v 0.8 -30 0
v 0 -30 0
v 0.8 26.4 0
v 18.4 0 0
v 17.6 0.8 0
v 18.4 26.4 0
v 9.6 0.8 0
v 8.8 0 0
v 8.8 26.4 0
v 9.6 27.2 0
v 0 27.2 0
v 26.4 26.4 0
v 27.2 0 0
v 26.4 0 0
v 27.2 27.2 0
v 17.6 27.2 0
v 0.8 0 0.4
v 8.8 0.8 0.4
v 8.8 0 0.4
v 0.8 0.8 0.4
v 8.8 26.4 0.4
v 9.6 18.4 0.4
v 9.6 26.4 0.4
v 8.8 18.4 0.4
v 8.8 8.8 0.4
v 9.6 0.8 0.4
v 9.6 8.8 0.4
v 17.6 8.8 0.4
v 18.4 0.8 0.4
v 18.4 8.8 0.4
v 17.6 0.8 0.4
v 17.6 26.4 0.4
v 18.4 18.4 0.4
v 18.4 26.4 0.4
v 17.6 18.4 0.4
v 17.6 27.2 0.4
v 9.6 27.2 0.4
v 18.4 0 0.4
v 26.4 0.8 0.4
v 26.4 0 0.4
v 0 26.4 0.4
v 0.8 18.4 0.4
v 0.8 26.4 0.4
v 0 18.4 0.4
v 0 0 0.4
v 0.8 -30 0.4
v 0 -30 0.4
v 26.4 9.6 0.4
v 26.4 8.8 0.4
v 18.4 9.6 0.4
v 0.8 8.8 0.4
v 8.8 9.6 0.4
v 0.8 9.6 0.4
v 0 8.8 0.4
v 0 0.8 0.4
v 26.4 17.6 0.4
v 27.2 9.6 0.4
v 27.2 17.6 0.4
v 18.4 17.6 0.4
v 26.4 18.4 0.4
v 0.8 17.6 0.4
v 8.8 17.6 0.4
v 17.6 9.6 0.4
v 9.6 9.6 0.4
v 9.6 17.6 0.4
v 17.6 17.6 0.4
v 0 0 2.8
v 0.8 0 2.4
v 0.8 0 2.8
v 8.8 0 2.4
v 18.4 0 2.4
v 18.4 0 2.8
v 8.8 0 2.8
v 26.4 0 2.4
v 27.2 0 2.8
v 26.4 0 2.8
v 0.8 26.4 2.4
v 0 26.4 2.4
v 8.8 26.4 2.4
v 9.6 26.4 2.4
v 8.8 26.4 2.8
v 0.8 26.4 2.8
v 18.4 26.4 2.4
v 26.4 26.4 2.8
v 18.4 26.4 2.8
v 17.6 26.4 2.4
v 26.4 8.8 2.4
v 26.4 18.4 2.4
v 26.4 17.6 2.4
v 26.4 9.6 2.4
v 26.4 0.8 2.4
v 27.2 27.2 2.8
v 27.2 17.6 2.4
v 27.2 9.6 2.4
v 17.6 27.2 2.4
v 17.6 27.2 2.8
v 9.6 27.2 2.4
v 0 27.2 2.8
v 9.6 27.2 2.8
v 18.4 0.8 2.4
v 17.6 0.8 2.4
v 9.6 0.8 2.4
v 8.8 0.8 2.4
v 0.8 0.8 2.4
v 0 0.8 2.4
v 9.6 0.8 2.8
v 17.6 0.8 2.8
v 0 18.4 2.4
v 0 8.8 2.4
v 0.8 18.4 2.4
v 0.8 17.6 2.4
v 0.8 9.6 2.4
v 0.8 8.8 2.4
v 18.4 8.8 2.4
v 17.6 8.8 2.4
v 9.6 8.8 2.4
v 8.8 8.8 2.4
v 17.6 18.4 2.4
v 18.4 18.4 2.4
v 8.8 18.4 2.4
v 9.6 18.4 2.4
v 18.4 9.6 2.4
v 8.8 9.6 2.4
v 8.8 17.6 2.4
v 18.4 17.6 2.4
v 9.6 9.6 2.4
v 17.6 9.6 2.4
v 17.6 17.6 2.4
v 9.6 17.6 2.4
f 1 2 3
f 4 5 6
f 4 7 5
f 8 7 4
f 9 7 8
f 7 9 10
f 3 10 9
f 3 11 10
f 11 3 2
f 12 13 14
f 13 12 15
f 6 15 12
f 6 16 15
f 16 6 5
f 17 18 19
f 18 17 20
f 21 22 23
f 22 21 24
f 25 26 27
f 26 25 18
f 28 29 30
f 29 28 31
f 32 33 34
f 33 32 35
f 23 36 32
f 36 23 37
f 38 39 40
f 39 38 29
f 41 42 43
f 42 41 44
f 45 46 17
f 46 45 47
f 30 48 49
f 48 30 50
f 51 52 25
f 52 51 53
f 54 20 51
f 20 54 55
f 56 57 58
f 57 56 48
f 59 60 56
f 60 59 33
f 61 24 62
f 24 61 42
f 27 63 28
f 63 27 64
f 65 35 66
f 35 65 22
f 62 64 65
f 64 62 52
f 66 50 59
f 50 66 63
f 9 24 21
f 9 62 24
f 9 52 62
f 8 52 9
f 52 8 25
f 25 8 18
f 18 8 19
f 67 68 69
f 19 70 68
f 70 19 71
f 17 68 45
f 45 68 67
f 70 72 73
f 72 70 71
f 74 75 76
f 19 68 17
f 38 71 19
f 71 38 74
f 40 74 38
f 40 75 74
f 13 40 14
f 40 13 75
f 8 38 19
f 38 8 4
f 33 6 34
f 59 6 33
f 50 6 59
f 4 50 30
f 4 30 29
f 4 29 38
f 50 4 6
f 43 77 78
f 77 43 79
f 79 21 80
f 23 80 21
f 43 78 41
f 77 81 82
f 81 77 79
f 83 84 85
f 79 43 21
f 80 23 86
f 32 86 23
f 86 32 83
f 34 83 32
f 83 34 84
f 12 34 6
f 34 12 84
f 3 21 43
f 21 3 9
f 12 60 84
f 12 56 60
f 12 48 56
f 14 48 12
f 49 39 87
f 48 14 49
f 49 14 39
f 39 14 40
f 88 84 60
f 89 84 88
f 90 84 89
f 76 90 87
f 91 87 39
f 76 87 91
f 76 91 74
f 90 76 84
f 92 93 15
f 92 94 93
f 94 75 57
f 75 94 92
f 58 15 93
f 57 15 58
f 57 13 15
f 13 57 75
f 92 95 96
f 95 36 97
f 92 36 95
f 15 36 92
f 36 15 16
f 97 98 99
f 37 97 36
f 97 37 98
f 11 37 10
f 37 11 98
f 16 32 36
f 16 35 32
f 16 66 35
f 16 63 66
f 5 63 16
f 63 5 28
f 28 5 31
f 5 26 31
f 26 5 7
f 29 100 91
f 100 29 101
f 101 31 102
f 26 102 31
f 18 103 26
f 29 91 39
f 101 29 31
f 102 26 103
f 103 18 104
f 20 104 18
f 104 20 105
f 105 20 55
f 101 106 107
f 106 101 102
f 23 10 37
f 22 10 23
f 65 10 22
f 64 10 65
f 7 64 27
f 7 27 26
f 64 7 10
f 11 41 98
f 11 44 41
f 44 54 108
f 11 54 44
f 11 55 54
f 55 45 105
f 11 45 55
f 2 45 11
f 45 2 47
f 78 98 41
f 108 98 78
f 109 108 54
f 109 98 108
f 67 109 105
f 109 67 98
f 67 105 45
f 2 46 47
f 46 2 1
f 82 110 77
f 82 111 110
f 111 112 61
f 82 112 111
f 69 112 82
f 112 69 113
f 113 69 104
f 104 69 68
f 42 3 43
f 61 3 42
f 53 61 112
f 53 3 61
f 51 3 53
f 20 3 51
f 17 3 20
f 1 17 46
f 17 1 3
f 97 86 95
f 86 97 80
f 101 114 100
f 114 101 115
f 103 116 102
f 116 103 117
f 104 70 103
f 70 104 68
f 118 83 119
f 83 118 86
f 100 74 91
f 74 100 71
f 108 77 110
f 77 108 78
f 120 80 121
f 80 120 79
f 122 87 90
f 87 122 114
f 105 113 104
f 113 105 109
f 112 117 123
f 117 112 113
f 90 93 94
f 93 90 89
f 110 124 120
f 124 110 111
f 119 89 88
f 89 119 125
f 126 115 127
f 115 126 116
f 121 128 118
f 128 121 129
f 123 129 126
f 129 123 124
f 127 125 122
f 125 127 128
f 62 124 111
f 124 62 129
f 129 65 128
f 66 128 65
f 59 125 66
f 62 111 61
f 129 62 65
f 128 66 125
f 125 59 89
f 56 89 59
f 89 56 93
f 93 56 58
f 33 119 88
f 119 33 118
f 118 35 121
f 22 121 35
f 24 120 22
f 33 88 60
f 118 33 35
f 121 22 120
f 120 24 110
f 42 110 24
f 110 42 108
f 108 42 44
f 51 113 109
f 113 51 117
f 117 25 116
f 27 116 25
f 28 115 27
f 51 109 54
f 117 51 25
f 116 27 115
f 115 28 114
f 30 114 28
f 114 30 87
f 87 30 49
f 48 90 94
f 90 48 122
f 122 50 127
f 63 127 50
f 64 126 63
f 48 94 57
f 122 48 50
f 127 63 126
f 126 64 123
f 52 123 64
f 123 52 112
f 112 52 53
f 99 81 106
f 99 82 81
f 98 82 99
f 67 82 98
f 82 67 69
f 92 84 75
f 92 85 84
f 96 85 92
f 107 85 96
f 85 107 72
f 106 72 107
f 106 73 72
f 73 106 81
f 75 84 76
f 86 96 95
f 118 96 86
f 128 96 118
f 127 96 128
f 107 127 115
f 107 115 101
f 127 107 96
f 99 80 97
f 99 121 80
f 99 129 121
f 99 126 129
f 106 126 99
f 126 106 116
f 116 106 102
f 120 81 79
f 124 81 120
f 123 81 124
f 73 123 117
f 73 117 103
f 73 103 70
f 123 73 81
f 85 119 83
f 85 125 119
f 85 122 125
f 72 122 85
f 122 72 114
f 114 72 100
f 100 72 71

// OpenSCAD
// file: ../../api/v3/reporting.scad
//////////////////////////////////////////////////////////////////////
// LibFile: reporting.scad
// Project: Grid Stack
// FileGroup: API v3 Reporting
// FileSummary: Console report for immutable direct and positive-gap coupons.
// Role: Records the exact environment, dimensions, support strategy, path
//       lengths, qualification status, and deposited-layer counts.
// Requires: API v3 indexes, mathematics, and path generator.
// Exports: report_structural_coupon_object().
//////////////////////////////////////////////////////////////////////

function _bridge_status3(span, process) =
    span <= process[PX3_BRIDGE_MAX]
        ? "within_owner_tested_limit"
        : "exploratory_beyond_owner_tested_limit";

module report_structural_coupon_object(object, report_level = "full") {
    material = object[SCO_MATERIAL];
    nozzle = object[SCO_NOZZLE];
    printer = object[SCO_PRINTER];
    process = object[SCO_PROCESS];
    boundary = object[SCO_BOUNDARY];
    gap = object[SCO_CLEAR_GAP];
    strategy = object[SCO_SUPPORT_STRATEGY];

    echo("--- Grid Stack immutable structural coupon ---");
    echo(str("Object: ", object[SCO_NAME], " revision ", object[SCO_REVISION]));
    echo(str("API/schema: ", object[SCO_REQUIRED_API], "/",
        object[SCO_SCHEMA_VERSION]));
    echo(str("Release/base commit: ", object[SCO_SOURCE_RELEASE], " / ",
        object[SCO_FRAMEWORK_BASE_COMMIT]));
    echo(str("Material/nozzle/printer: ", material[MAT3_FAMILY], " / ",
        nozzle[NZ3_DIAMETER], " mm / ", printer[PRN3_NAME]));
    echo(str("Cells: ", boundary[B3_CELLS_X], " x ", boundary[B3_CELLS_Y]));
    echo(str("Clear spans: ", boundary[B3_CLEAR_SPAN_X], " x ",
        boundary[B3_CLEAR_SPAN_Y], " mm"));
    echo(str("Span status: ",
        _bridge_status3(boundary[B3_CLEAR_SPAN_X], process)));
    echo(str("Outside size: ", boundary_size_x3(boundary, process, nozzle),
        " x ", boundary_size_y3(boundary, process, nozzle), " mm"));
    echo(str("Primitive trace: ", trace_width3(nozzle), " x ",
        trace_height3(process), " mm"));
    echo(str("Structural strand: ", strand_width3(process, nozzle), " x ",
        strand_height3(process), " mm"));
    echo(str("Clear vertical gap: ", gap, " mm"));
    echo(str("Support strategy: ", strategy));
    echo(str("Total modeled height: ", coupon_total_height3(object), " mm"));

    if (report_level == "full") {
        if (strategy == "direct_orthogonal") {
            lower = coupon_path(
                boundary, process, nozzle, 0, object[SCO_LEAD_IN]
            );
            upper = coupon_path(boundary, process, nozzle, 90, 0);
            echo(str("Lower/upper path lengths: ", path_length3(lower),
                " / ", path_length3(upper), " mm"));
            echo(str("Deposited layers: ", 2 * process[PX3_HEIGHT_PASSES]));
        }
        else {
            witness = coupon_path(
                boundary, process, nozzle, 90, object[SCO_LEAD_IN]
            );
            riser = coupon_path(boundary, process, nozzle, 0, 0);
            test = coupon_path(boundary, process, nozzle, 90, 0);
            echo(str("Witness/riser/test path lengths: ",
                path_length3(witness), " / ", path_length3(riser), " / ",
                path_length3(test), " mm"));
            echo(str("Riser deposited layers: ", round(gap_layer_count3(object))));
            echo(str("Total deposited layers: ",
                2 * process[PX3_HEIGHT_PASSES] +
                round(gap_layer_count3(object))));
        }
        echo(str("Status: ", object[SCO_STATUS]));
        echo(str("Notes: ", object[SCO_NOTES]));
    }
}
// file: ../../api/v3/validation.scad
//////////////////////////////////////////////////////////////////////
// LibFile: validation.scad
// Project: Grid Stack
// FileGroup: API v3 Validation
// FileSummary: Validates immutable environment records, count boundaries,
//              support strategy, path continuity, and layer quantization.
// Role: Rejects incompatible or physically floating recipes before geometry
//       is generated.
// Requires: API v3 indexes, mathematics, and path generator.
// Exports: validate_structural_coupon_object().
//////////////////////////////////////////////////////////////////////

module _validate_path3(points, boundary, orientation, lead_in) {
    run_count = orientation == 0
        ? boundary_strand_count_y3(boundary)
        : boundary_strand_count_x3(boundary);

    assert(len(points) == expected_coupon_point_count3(run_count, lead_in),
        "API v3 coupon path has an unexpected point count.");
    assert(!path_has_zero_segment3(points),
        "API v3 coupon path contains a zero-length segment.");
    assert(path_axis_aligned3(points),
        "API v3 coupon path must remain axis-aligned.");
    assert(points[0] != points[len(points) - 1],
        "API v3 coupon path must remain open.");
}

module validate_structural_coupon_object(object) {
    assert(object[SCO_REQUIRED_API] == GRID_STACK_API_VERSION,
        "Saved coupon requires a different Grid Stack API version.");
    assert(object[SCO_SCHEMA_VERSION] == GRID_STACK_COUPON_SCHEMA_VERSION,
        "Saved coupon requires a different coupon schema version.");
    assert(GRID_STACK_RECTANGULAR_FRAMEWORK_VERSION == 2,
        "Saved coupon requires rectangular framework version 2.");

    material = object[SCO_MATERIAL];
    nozzle = object[SCO_NOZZLE];
    printer = object[SCO_PRINTER];
    process = object[SCO_PROCESS];
    boundary = object[SCO_BOUNDARY];
    gap = object[SCO_CLEAR_GAP];
    lead_in = object[SCO_LEAD_IN];
    strategy = object[SCO_SUPPORT_STRATEGY];

    assert(nozzle[NZ3_DIAMETER] > 0,
        "Saved coupon nozzle diameter must be positive.");
    assert(process[PX3_LAYER_H] > 0,
        "Saved coupon layer height must be positive.");
    assert(process[PX3_WIDTH_PASSES] >= 2,
        "Saved coupon structural width requires at least two passes.");
    assert(process[PX3_HEIGHT_PASSES] >= 2,
        "Saved coupon structural height requires at least two layers.");
    assert(process[PX3_MATERIAL] == material[MAT3_NAME],
        "Saved coupon process/material references do not match.");
    assert(process[PX3_NOZZLE] == nozzle[NZ3_NAME],
        "Saved coupon process/nozzle references do not match.");
    assert(process[PX3_PRINTER] == printer[PRN3_NAME],
        "Saved coupon process/printer references do not match.");
    assert(boundary[B3_CELLS_X] > 0 && boundary[B3_CELLS_Y] > 0,
        "Saved coupon cell counts must be positive.");
    assert(boundary[B3_CLEAR_SPAN_X] > 0 &&
           boundary[B3_CLEAR_SPAN_Y] > 0,
        "Saved coupon clear spans must be positive.");
    assert(lead_in >= 0,
        "Saved coupon lead-in cannot be negative.");
    assert(gap >= 0,
        "Saved coupon clear gap cannot be negative.");
    assert(nearly_equal3(gap_layer_count3(object), round(gap_layer_count3(object))),
        "Saved coupon clear gap must equal a whole deposited-layer count.");
    assert(
        (strategy == "direct_orthogonal" && nearly_equal3(gap, 0)) ||
        (strategy == "witness_riser_bridge" && gap > 0),
        "Saved coupon support strategy does not match its clear gap."
    );

    if (strategy == "direct_orthogonal") {
        lower = coupon_path(boundary, process, nozzle, 0, lead_in);
        upper = coupon_path(boundary, process, nozzle, 90, 0);
        _validate_path3(lower, boundary, 0, lead_in);
        _validate_path3(upper, boundary, 90, 0);
        entry = lead_in > 0 ? 1 : 0;
        assert(nearly_equal3(point_distance_2d3(lower[entry], upper[0]), 0),
            "Direct upper path must start on the lower entry crossing.");
    }
    else {
        witness = coupon_path(boundary, process, nozzle, 90, lead_in);
        riser = coupon_path(boundary, process, nozzle, 0, 0);
        test = coupon_path(boundary, process, nozzle, 90, 0);
        _validate_path3(witness, boundary, 90, lead_in);
        _validate_path3(riser, boundary, 0, 0);
        _validate_path3(test, boundary, 90, 0);
        entry = lead_in > 0 ? 1 : 0;
        assert(nearly_equal3(point_distance_2d3(witness[entry], riser[0]), 0),
            "Riser path must start on the witness entry crossing.");
        assert(nearly_equal3(point_distance_2d3(riser[0], test[0]), 0),
            "Upper test path must start on the riser entry crossing.");
        for (i = [0 : len(test) - 1])
            assert(nearly_equal3(point_distance_2d3(test[i], witness[i + entry]), 0),
                "Upper test path must align directly above the witness path.");
    }

    echo("GRID STACK API V3 COUPON VALIDATION: PASS");
}
// file: ../../api/v3/geometry.scad
//////////////////////////////////////////////////////////////////////
// LibFile: geometry.scad
// Project: Grid Stack
// FileGroup: API v3 Printable Geometry
// FileSummary: Creates square-ended structural paths, direct-contact coupons,
//              positive witness/riser/bridge coupons, and simple diagnostics.
// Role: Supplies all geometry used by immutable API v3 recipes without
//       importing mutable workbench geometry.
// Requires: API v3 mathematics and ordered axis-aligned paths.
// Exports: render_direct_coupon(), render_positive_gap_coupon(), and
//          render_coupon_path_debug().
//////////////////////////////////////////////////////////////////////

module _segment_2d3(a, b, width) {
    horizontal = nearly_equal3(a[1], b[1]);
    vertical = nearly_equal3(a[0], b[0]);

    assert(horizontal || vertical,
        "API v3 printable segments must be horizontal or vertical.");
    assert(!nearly_equal3(point_distance_2d3(a, b), 0),
        "API v3 printable segments must have nonzero length.");

    if (horizontal)
        translate([min(a[0], b[0]) - width / 2, a[1] - width / 2])
            square([abs(b[0] - a[0]) + width, width]);
    else
        translate([a[0] - width / 2, min(a[1], b[1]) - width / 2])
            square([width, abs(b[1] - a[1]) + width]);
}

module _path_2d3(points, width) {
    union()
        for (i = [0 : len(points) - 2])
            _segment_2d3(points[i], points[i + 1], width);
}

module _structural_path3(points, process, nozzle) {
    linear_extrude(height = strand_height3(process), convexity = 10)
        _path_2d3(points, strand_width3(process, nozzle));
}

module render_direct_coupon(lower, upper, process, nozzle) {
    union() {
        _structural_path3(lower, process, nozzle);
        translate([0, 0, strand_height3(process)])
            _structural_path3(upper, process, nozzle);
    }
}

module render_positive_gap_coupon(
    witness, riser, test, process, nozzle, clear_gap
) {
    union() {
        _structural_path3(witness, process, nozzle);

        translate([0, 0, strand_height3(process)])
            linear_extrude(height = clear_gap, convexity = 10)
                _path_2d3(riser, strand_width3(process, nozzle));

        translate([0, 0, strand_height3(process) + clear_gap])
            _structural_path3(test, process, nozzle);
    }
}

module _debug_path3(points, z, width) {
    translate([0, 0, z])
        linear_extrude(height = 0.04)
            _path_2d3(points, width);
}

module render_coupon_path_debug(
    lower, upper, riser, process, clear_gap = 0
) {
    width = max(0.12, trace_height3(process));
    _debug_path3(lower, 0, width);
    if (len(riser) > 0)
        _debug_path3(riser, strand_height3(process), width);
    _debug_path3(
        upper,
        strand_height3(process) + clear_gap,
        width
    );
}
// file: ../../api/v3/paths.scad
//////////////////////////////////////////////////////////////////////
// LibFile: paths.scad
// Project: Grid Stack
// FileGroup: API v3 Path Generation
// FileSummary: Generates one open rectangular serpentine centerline from a
//              count boundary for X- or Y-running structural paths.
// Role: Preserves parallel runs, square connectors, optional single lead-in,
//       and one uninterrupted ordered point list per deposited layer.
// Requires: API v3 indexes and mathematics.
// Exports: coupon_path() and expected_coupon_point_count3().
//////////////////////////////////////////////////////////////////////

function _x_rows3(row, count, x_min, x_max, y_min, pitch) =
    row >= count
        ? []
        : let(
            y = y_min + row * pitch,
            x_end = row % 2 == 0 ? x_max : x_min,
            row_end = [x_end, y],
            connector_end = [x_end, y + pitch]
        )
        concat(
            [row_end],
            row < count - 1 ? [connector_end] : [],
            _x_rows3(row + 1, count, x_min, x_max, y_min, pitch)
        );

function _y_columns3(column, count, x_min, y_min, y_max, pitch) =
    column >= count
        ? []
        : let(
            x = x_min + column * pitch,
            y_end = column % 2 == 0 ? y_max : y_min,
            column_end = [x, y_end],
            connector_end = [x + pitch, y_end]
        )
        concat(
            [column_end],
            column < count - 1 ? [connector_end] : [],
            _y_columns3(column + 1, count, x_min, y_min, y_max, pitch)
        );

function expected_coupon_point_count3(run_count, lead_in = 0) =
    2 * run_count + (lead_in > 0 ? 1 : 0);

function coupon_path(
    boundary, process, nozzle, orientation = 0, lead_in = 0
) =
    assert(orientation == 0 || orientation == 90,
        "API v3 coupon orientation must be 0 or 90 degrees.")
    assert(lead_in >= 0,
        "API v3 coupon lead-in cannot be negative.")
    let(
        width = strand_width3(process, nozzle),
        x_min = width / 2,
        y_min = width / 2,
        x_max = boundary_size_x3(boundary, process, nozzle) - width / 2,
        y_max = boundary_size_y3(boundary, process, nozzle) - width / 2,
        entry = [x_min, y_min],
        prefix = lead_in > 0
            ? (orientation == 0
                ? [[x_min - lead_in, y_min], entry]
                : [[x_min, y_min - lead_in], entry])
            : [entry]
    )
    orientation == 0
        ? concat(
            prefix,
            _x_rows3(
                0, boundary_strand_count_y3(boundary),
                x_min, x_max, y_min,
                boundary_pitch_y3(boundary, process, nozzle)
            )
        )
        : concat(
            prefix,
            _y_columns3(
                0, boundary_strand_count_x3(boundary),
                x_min, y_min, y_max,
                boundary_pitch_x3(boundary, process, nozzle)
            )
        );
// file: ../../api/v3/math.scad
//////////////////////////////////////////////////////////////////////
// LibFile: math.scad
// Project: Grid Stack
// FileGroup: API v3 Mathematics
// FileSummary: Pure trace, strand, boundary, path, and layer-count helpers.
// Role: Keeps API v3 calculations isolated and reproducible without importing
//       mutable workbench mathematics.
// Requires: API v3 indexes.
// Exports: nearly_equal3(), trace/strand dimensions, boundary dimensions,
//          path inspection, gap-layer count, and total-height helpers.
//////////////////////////////////////////////////////////////////////

function nearly_equal3(a, b, epsilon = 0.000001) = abs(a - b) <= epsilon;

function trace_width3(nozzle) = nozzle[NZ3_DIAMETER];
function trace_height3(process) = process[PX3_LAYER_H];
function strand_width3(process, nozzle) =
    trace_width3(nozzle) * process[PX3_WIDTH_PASSES];
function strand_height3(process) =
    trace_height3(process) * process[PX3_HEIGHT_PASSES];

function boundary_strand_count_x3(boundary) = boundary[B3_CELLS_X] + 1;
function boundary_strand_count_y3(boundary) = boundary[B3_CELLS_Y] + 1;
function boundary_pitch_x3(boundary, process, nozzle) =
    boundary[B3_CLEAR_SPAN_X] + strand_width3(process, nozzle);
function boundary_pitch_y3(boundary, process, nozzle) =
    boundary[B3_CLEAR_SPAN_Y] + strand_width3(process, nozzle);
function boundary_size_x3(boundary, process, nozzle) =
    boundary[B3_CELLS_X] * boundary[B3_CLEAR_SPAN_X] +
    boundary_strand_count_x3(boundary) * strand_width3(process, nozzle);
function boundary_size_y3(boundary, process, nozzle) =
    boundary[B3_CELLS_Y] * boundary[B3_CLEAR_SPAN_Y] +
    boundary_strand_count_y3(boundary) * strand_width3(process, nozzle);

function point_distance_2d3(a, b) =
    sqrt(pow(b[0] - a[0], 2) + pow(b[1] - a[1], 2));
function path_length3(points, i = 0) =
    i >= len(points) - 1
        ? 0
        : point_distance_2d3(points[i], points[i + 1]) +
          path_length3(points, i + 1);
function path_has_zero_segment3(points, i = 0) =
    i >= len(points) - 1
        ? false
        : nearly_equal3(point_distance_2d3(points[i], points[i + 1]), 0)
            ? true
            : path_has_zero_segment3(points, i + 1);
function segment_axis_aligned3(a, b) =
    nearly_equal3(a[0], b[0]) || nearly_equal3(a[1], b[1]);
function path_axis_aligned3(points, i = 0) =
    i >= len(points) - 1
        ? true
        : segment_axis_aligned3(points[i], points[i + 1]) &&
          path_axis_aligned3(points, i + 1);

function gap_layer_count3(object) =
    object[SCO_CLEAR_GAP] / trace_height3(object[SCO_PROCESS]);
function coupon_total_height3(object) =
    2 * strand_height3(object[SCO_PROCESS]) + object[SCO_CLEAR_GAP];
// file: ../../api/v3/schema.scad
//////////////////////////////////////////////////////////////////////
// LibFile: schema.scad
// Project: Grid Stack
// FileGroup: API v3 Data Model
// FileSummary: Constructors for self-contained immutable structural coupons.
// Role: Makes every geometry-affecting environment and object value explicit
//       inside the saved recipe rather than resolving mutable catalog names.
// Exports: material_spec(), nozzle_spec(), printer_spec(),
//          structural_process_profile(), count_boundary(), and
//          structural_coupon_object().
//////////////////////////////////////////////////////////////////////

function material_spec(
    name, family, flexibility, status = "in_use", notes = ""
) = [name, family, flexibility, status, notes];

function nozzle_spec(
    name, diameter, construction = "brass", status = "in_use", notes = ""
) = [name, diameter, construction, status, notes];

function printer_spec(
    name,
    manufacturer = "",
    model = "",
    motion_system = "",
    build_surface = "",
    status = "unrecorded",
    notes = ""
) = [
    name, manufacturer, model, motion_system,
    build_surface, status, notes
];

function structural_process_profile(
    name,
    material_name,
    nozzle_name,
    printer_name,
    layer_height,
    width_passes,
    height_passes,
    bridge_max,
    qualification,
    revision,
    notes = ""
) = [
    name, material_name, nozzle_name, printer_name,
    layer_height, width_passes, height_passes, bridge_max,
    qualification, revision, notes
];

// Function: count_boundary()
// Synopsis: Stores clear-opening counts and clear spans for one rectangle.
function count_boundary(
    name,
    cells_x,
    cells_y,
    clear_span_x,
    clear_span_y,
    notes = ""
) = [name, cells_x, cells_y, clear_span_x, clear_span_y, notes];

// Function: structural_coupon_object()
// Synopsis: Constructs one permanent coupon recipe.
// Description:
//   framework_base_commit records the last accepted repository state used to
//   begin the API implementation. The Git commit containing this recipe is the
//   authoritative complete source; a file cannot embed its own future hash.
function structural_coupon_object(
    name,
    revision,
    required_api_version,
    coupon_schema_version,
    source_release,
    framework_base_commit,
    material,
    nozzle,
    printer,
    process,
    boundary,
    clear_vertical_gap,
    lead_in,
    support_strategy,
    status = "calibration",
    notes = ""
) = [
    name,
    revision,
    required_api_version,
    coupon_schema_version,
    source_release,
    framework_base_commit,
    material,
    nozzle,
    printer,
    process,
    boundary,
    clear_vertical_gap,
    lead_in,
    support_strategy,
    status,
    notes
];
// file: ../../api/v3/indices.scad
//////////////////////////////////////////////////////////////////////
// LibFile: indices.scad
// Project: Grid Stack
// FileGroup: API v3 Data Model
// FileSummary: Named indexes for immutable structural-coupon records.
// Role: Prevents unexplained numeric indexes from entering saved recipes and
//       keeps API version 3 independent of mutable workbench indexes.
// Exports: MAT3_*, NZ3_*, PRN3_*, PX3_*, B3_*, and SCO_* constants.
//////////////////////////////////////////////////////////////////////

MAT3_NAME = 0;
MAT3_FAMILY = 1;
MAT3_FLEXIBILITY = 2;
MAT3_STATUS = 3;
MAT3_NOTES = 4;

NZ3_NAME = 0;
NZ3_DIAMETER = 1;
NZ3_CONSTRUCTION = 2;
NZ3_STATUS = 3;
NZ3_NOTES = 4;

PRN3_NAME = 0;
PRN3_MANUFACTURER = 1;
PRN3_MODEL = 2;
PRN3_MOTION_SYSTEM = 3;
PRN3_BUILD_SURFACE = 4;
PRN3_STATUS = 5;
PRN3_NOTES = 6;

PX3_NAME = 0;
PX3_MATERIAL = 1;
PX3_NOZZLE = 2;
PX3_PRINTER = 3;
PX3_LAYER_H = 4;
PX3_WIDTH_PASSES = 5;
PX3_HEIGHT_PASSES = 6;
PX3_BRIDGE_MAX = 7;
PX3_QUALIFICATION = 8;
PX3_REVISION = 9;
PX3_NOTES = 10;

B3_NAME = 0;
B3_CELLS_X = 1;
B3_CELLS_Y = 2;
B3_CLEAR_SPAN_X = 3;
B3_CLEAR_SPAN_Y = 4;
B3_NOTES = 5;

SCO_NAME = 0;
SCO_REVISION = 1;
SCO_REQUIRED_API = 2;
SCO_SCHEMA_VERSION = 3;
SCO_SOURCE_RELEASE = 4;
SCO_FRAMEWORK_BASE_COMMIT = 5;
SCO_MATERIAL = 6;
SCO_NOZZLE = 7;
SCO_PRINTER = 8;
SCO_PROCESS = 9;
SCO_BOUNDARY = 10;
SCO_CLEAR_GAP = 11;
SCO_LEAD_IN = 12;
SCO_SUPPORT_STRATEGY = 13;
SCO_STATUS = 14;
SCO_NOTES = 15;
// file: ../../api/grid_stack_v3.scad
//////////////////////////////////////////////////////////////////////
// LibFile: grid_stack_v3.scad
// Project: Grid Stack
// FileGroup: Versioned Public Interface
// FileSummary: Immutable API version 3 for rectangular count-boundary
//              structural coupons, including positive witness/riser gaps.
// Role: Reconstructs saved coupon recipes without Customizer state or mutable
//       workbench catalogs. Incompatible behavior requires a new API file.
// Exports: API/schema constants, record constructors, validation, reporting,
//          and structural_coupon_render().
//////////////////////////////////////////////////////////////////////

GRID_STACK_API_VERSION = 3;
GRID_STACK_COUPON_SCHEMA_VERSION = 1;
GRID_STACK_RECTANGULAR_FRAMEWORK_VERSION = 2;
GRID_STACK_RELEASE = "1.0.0";

include <v3/indices.scad>
include <v3/schema.scad>
include <v3/math.scad>
include <v3/paths.scad>
include <v3/geometry.scad>
include <v3/validation.scad>
include <v3/reporting.scad>

// Module: structural_coupon_render()
// Synopsis: Validates, reports, and renders one immutable coupon recipe.
// Arguments:
//   object = Record returned by structural_coupon_object().
//   mode = print, path_debug, or report_only.
//   report_level = summary or full.
module structural_coupon_render(
    object,
    mode = "print",
    report_level = "full"
) {
    validate_structural_coupon_object(object);
    report_structural_coupon_object(object, report_level);

    boundary = object[SCO_BOUNDARY];
    process = object[SCO_PROCESS];
    nozzle = object[SCO_NOZZLE];
    lead_in = object[SCO_LEAD_IN];
    clear_gap = object[SCO_CLEAR_GAP];
    strategy = object[SCO_SUPPORT_STRATEGY];

    if (strategy == "direct_orthogonal") {
        lower = coupon_path(boundary, process, nozzle, 0, lead_in);
        upper = coupon_path(boundary, process, nozzle, 90, 0);

        if (mode == "print")
            render_direct_coupon(lower, upper, process, nozzle);
        else if (mode == "path_debug")
            render_coupon_path_debug(lower, upper, [], process);
        else if (mode == "report_only")
            echo("Grid Stack API v3 report-only mode: no geometry generated.");
        else
            assert(false, str("Unknown API v3 render mode: ", mode));
    }
    else if (strategy == "witness_riser_bridge") {
        witness = coupon_path(boundary, process, nozzle, 90, lead_in);
        riser = coupon_path(boundary, process, nozzle, 0, 0);
        test = coupon_path(boundary, process, nozzle, 90, 0);

        if (mode == "print")
            render_positive_gap_coupon(
                witness, riser, test, process, nozzle, clear_gap
            );
        else if (mode == "path_debug")
            render_coupon_path_debug(witness, test, riser, process, clear_gap);
        else if (mode == "report_only")
            echo("Grid Stack API v3 report-only mode: no geometry generated.");
        else
            assert(false, str("Unknown API v3 render mode: ", mode));
    }
    else
        assert(false, str("Unknown coupon support strategy: ", strategy));
}
// main file
//////////////////////////////////////////////////////////////////////
// LibFile: coupon-3x3-span8-gap2-pla-plus-0p4-v1.scad
// Project: Grid Stack
// FileGroup: Immutable Structural Coupon
// FileSummary: 3 x 3 PLA+ coupon with 8 mm clear XY spans and 2 mm
//              clear vertical gap using witness_riser_bridge geometry.
// Role: Permanently reconstructs one calibration object without Customizer
//       state or mutable workbench catalog lookup.
// FrameworkBaseCommit: 4b5e564
// Requires: Grid Stack API version 3 and coupon schema version 1.
// Output: Printable continuous-path structural coupon geometry.
//////////////////////////////////////////////////////////////////////

include <../../api/grid_stack_v3.scad>

assert(GRID_STACK_API_VERSION == 3,
    "This recipe requires Grid Stack API version 3.");
assert(GRID_STACK_COUPON_SCHEMA_VERSION == 1,
    "This recipe requires coupon schema version 1.");
assert(GRID_STACK_RECTANGULAR_FRAMEWORK_VERSION == 2,
    "This recipe requires rectangular framework version 2.");

saved_material = material_spec(
    name = "PLA_PLUS",
    family = "PLA+",
    flexibility = "rigid",
    status = "in_use",
    notes = "Exact material family selected for the coupon matrix."
);

saved_nozzle = nozzle_spec(
    name = "BRASS_0P4",
    diameter = 0.4,
    construction = "brass",
    status = "in_use",
    notes = "Nominal nozzle diameter used to derive the 0.8 mm strand width."
);

saved_printer = printer_spec(
    name = "UNRECORDED_PRINTER_R1",
    manufacturer = "",
    model = "",
    motion_system = "",
    build_surface = "",
    status = "unrecorded",
    notes = "Printer identity was not frozen with this coupon framework."
);

saved_process = structural_process_profile(
    name = "PLA_PLUS_0P4_LH0P2_W2_H2_R1",
    material_name = "PLA_PLUS",
    nozzle_name = "BRASS_0P4",
    printer_name = "UNRECORDED_PRINTER_R1",
    layer_height = 0.2,
    width_passes = 2,
    height_passes = 2,
    bridge_max = 6,
    qualification = "owner_tested_to_6mm",
    revision = 1,
    notes = "Primitive trace 0.4 x 0.2 mm; structural strand 0.8 x 0.4 mm."
);

saved_boundary = count_boundary(
    name = "COUNT_3X3_SPAN8",
    cells_x = 3,
    cells_y = 3,
    clear_span_x = 8,
    clear_span_y = 8,
    notes = "Outside dimensions derive from four strands and three clear openings."
);

saved_coupon = structural_coupon_object(
    name = "COUPON_3X3_SPAN8_GAP2_PLA_PLUS_0P4_V1",
    revision = 1,
    required_api_version = 3,
    coupon_schema_version = 1,
    source_release = "1.0.0",
    framework_base_commit = "4b5e564",
    material = saved_material,
    nozzle = saved_nozzle,
    printer = saved_printer,
    process = saved_process,
    boundary = saved_boundary,
    clear_vertical_gap = 2,
    lead_in = 30,
    support_strategy = "witness_riser_bridge",
    status = "calibration_unprinted",
    notes = "Calibration recipe generated from the frozen Batch 010 framework; record results in a new revision after printing."
);

structural_coupon_render(
    saved_coupon,
    mode = "print",
    report_level = "full"
);
